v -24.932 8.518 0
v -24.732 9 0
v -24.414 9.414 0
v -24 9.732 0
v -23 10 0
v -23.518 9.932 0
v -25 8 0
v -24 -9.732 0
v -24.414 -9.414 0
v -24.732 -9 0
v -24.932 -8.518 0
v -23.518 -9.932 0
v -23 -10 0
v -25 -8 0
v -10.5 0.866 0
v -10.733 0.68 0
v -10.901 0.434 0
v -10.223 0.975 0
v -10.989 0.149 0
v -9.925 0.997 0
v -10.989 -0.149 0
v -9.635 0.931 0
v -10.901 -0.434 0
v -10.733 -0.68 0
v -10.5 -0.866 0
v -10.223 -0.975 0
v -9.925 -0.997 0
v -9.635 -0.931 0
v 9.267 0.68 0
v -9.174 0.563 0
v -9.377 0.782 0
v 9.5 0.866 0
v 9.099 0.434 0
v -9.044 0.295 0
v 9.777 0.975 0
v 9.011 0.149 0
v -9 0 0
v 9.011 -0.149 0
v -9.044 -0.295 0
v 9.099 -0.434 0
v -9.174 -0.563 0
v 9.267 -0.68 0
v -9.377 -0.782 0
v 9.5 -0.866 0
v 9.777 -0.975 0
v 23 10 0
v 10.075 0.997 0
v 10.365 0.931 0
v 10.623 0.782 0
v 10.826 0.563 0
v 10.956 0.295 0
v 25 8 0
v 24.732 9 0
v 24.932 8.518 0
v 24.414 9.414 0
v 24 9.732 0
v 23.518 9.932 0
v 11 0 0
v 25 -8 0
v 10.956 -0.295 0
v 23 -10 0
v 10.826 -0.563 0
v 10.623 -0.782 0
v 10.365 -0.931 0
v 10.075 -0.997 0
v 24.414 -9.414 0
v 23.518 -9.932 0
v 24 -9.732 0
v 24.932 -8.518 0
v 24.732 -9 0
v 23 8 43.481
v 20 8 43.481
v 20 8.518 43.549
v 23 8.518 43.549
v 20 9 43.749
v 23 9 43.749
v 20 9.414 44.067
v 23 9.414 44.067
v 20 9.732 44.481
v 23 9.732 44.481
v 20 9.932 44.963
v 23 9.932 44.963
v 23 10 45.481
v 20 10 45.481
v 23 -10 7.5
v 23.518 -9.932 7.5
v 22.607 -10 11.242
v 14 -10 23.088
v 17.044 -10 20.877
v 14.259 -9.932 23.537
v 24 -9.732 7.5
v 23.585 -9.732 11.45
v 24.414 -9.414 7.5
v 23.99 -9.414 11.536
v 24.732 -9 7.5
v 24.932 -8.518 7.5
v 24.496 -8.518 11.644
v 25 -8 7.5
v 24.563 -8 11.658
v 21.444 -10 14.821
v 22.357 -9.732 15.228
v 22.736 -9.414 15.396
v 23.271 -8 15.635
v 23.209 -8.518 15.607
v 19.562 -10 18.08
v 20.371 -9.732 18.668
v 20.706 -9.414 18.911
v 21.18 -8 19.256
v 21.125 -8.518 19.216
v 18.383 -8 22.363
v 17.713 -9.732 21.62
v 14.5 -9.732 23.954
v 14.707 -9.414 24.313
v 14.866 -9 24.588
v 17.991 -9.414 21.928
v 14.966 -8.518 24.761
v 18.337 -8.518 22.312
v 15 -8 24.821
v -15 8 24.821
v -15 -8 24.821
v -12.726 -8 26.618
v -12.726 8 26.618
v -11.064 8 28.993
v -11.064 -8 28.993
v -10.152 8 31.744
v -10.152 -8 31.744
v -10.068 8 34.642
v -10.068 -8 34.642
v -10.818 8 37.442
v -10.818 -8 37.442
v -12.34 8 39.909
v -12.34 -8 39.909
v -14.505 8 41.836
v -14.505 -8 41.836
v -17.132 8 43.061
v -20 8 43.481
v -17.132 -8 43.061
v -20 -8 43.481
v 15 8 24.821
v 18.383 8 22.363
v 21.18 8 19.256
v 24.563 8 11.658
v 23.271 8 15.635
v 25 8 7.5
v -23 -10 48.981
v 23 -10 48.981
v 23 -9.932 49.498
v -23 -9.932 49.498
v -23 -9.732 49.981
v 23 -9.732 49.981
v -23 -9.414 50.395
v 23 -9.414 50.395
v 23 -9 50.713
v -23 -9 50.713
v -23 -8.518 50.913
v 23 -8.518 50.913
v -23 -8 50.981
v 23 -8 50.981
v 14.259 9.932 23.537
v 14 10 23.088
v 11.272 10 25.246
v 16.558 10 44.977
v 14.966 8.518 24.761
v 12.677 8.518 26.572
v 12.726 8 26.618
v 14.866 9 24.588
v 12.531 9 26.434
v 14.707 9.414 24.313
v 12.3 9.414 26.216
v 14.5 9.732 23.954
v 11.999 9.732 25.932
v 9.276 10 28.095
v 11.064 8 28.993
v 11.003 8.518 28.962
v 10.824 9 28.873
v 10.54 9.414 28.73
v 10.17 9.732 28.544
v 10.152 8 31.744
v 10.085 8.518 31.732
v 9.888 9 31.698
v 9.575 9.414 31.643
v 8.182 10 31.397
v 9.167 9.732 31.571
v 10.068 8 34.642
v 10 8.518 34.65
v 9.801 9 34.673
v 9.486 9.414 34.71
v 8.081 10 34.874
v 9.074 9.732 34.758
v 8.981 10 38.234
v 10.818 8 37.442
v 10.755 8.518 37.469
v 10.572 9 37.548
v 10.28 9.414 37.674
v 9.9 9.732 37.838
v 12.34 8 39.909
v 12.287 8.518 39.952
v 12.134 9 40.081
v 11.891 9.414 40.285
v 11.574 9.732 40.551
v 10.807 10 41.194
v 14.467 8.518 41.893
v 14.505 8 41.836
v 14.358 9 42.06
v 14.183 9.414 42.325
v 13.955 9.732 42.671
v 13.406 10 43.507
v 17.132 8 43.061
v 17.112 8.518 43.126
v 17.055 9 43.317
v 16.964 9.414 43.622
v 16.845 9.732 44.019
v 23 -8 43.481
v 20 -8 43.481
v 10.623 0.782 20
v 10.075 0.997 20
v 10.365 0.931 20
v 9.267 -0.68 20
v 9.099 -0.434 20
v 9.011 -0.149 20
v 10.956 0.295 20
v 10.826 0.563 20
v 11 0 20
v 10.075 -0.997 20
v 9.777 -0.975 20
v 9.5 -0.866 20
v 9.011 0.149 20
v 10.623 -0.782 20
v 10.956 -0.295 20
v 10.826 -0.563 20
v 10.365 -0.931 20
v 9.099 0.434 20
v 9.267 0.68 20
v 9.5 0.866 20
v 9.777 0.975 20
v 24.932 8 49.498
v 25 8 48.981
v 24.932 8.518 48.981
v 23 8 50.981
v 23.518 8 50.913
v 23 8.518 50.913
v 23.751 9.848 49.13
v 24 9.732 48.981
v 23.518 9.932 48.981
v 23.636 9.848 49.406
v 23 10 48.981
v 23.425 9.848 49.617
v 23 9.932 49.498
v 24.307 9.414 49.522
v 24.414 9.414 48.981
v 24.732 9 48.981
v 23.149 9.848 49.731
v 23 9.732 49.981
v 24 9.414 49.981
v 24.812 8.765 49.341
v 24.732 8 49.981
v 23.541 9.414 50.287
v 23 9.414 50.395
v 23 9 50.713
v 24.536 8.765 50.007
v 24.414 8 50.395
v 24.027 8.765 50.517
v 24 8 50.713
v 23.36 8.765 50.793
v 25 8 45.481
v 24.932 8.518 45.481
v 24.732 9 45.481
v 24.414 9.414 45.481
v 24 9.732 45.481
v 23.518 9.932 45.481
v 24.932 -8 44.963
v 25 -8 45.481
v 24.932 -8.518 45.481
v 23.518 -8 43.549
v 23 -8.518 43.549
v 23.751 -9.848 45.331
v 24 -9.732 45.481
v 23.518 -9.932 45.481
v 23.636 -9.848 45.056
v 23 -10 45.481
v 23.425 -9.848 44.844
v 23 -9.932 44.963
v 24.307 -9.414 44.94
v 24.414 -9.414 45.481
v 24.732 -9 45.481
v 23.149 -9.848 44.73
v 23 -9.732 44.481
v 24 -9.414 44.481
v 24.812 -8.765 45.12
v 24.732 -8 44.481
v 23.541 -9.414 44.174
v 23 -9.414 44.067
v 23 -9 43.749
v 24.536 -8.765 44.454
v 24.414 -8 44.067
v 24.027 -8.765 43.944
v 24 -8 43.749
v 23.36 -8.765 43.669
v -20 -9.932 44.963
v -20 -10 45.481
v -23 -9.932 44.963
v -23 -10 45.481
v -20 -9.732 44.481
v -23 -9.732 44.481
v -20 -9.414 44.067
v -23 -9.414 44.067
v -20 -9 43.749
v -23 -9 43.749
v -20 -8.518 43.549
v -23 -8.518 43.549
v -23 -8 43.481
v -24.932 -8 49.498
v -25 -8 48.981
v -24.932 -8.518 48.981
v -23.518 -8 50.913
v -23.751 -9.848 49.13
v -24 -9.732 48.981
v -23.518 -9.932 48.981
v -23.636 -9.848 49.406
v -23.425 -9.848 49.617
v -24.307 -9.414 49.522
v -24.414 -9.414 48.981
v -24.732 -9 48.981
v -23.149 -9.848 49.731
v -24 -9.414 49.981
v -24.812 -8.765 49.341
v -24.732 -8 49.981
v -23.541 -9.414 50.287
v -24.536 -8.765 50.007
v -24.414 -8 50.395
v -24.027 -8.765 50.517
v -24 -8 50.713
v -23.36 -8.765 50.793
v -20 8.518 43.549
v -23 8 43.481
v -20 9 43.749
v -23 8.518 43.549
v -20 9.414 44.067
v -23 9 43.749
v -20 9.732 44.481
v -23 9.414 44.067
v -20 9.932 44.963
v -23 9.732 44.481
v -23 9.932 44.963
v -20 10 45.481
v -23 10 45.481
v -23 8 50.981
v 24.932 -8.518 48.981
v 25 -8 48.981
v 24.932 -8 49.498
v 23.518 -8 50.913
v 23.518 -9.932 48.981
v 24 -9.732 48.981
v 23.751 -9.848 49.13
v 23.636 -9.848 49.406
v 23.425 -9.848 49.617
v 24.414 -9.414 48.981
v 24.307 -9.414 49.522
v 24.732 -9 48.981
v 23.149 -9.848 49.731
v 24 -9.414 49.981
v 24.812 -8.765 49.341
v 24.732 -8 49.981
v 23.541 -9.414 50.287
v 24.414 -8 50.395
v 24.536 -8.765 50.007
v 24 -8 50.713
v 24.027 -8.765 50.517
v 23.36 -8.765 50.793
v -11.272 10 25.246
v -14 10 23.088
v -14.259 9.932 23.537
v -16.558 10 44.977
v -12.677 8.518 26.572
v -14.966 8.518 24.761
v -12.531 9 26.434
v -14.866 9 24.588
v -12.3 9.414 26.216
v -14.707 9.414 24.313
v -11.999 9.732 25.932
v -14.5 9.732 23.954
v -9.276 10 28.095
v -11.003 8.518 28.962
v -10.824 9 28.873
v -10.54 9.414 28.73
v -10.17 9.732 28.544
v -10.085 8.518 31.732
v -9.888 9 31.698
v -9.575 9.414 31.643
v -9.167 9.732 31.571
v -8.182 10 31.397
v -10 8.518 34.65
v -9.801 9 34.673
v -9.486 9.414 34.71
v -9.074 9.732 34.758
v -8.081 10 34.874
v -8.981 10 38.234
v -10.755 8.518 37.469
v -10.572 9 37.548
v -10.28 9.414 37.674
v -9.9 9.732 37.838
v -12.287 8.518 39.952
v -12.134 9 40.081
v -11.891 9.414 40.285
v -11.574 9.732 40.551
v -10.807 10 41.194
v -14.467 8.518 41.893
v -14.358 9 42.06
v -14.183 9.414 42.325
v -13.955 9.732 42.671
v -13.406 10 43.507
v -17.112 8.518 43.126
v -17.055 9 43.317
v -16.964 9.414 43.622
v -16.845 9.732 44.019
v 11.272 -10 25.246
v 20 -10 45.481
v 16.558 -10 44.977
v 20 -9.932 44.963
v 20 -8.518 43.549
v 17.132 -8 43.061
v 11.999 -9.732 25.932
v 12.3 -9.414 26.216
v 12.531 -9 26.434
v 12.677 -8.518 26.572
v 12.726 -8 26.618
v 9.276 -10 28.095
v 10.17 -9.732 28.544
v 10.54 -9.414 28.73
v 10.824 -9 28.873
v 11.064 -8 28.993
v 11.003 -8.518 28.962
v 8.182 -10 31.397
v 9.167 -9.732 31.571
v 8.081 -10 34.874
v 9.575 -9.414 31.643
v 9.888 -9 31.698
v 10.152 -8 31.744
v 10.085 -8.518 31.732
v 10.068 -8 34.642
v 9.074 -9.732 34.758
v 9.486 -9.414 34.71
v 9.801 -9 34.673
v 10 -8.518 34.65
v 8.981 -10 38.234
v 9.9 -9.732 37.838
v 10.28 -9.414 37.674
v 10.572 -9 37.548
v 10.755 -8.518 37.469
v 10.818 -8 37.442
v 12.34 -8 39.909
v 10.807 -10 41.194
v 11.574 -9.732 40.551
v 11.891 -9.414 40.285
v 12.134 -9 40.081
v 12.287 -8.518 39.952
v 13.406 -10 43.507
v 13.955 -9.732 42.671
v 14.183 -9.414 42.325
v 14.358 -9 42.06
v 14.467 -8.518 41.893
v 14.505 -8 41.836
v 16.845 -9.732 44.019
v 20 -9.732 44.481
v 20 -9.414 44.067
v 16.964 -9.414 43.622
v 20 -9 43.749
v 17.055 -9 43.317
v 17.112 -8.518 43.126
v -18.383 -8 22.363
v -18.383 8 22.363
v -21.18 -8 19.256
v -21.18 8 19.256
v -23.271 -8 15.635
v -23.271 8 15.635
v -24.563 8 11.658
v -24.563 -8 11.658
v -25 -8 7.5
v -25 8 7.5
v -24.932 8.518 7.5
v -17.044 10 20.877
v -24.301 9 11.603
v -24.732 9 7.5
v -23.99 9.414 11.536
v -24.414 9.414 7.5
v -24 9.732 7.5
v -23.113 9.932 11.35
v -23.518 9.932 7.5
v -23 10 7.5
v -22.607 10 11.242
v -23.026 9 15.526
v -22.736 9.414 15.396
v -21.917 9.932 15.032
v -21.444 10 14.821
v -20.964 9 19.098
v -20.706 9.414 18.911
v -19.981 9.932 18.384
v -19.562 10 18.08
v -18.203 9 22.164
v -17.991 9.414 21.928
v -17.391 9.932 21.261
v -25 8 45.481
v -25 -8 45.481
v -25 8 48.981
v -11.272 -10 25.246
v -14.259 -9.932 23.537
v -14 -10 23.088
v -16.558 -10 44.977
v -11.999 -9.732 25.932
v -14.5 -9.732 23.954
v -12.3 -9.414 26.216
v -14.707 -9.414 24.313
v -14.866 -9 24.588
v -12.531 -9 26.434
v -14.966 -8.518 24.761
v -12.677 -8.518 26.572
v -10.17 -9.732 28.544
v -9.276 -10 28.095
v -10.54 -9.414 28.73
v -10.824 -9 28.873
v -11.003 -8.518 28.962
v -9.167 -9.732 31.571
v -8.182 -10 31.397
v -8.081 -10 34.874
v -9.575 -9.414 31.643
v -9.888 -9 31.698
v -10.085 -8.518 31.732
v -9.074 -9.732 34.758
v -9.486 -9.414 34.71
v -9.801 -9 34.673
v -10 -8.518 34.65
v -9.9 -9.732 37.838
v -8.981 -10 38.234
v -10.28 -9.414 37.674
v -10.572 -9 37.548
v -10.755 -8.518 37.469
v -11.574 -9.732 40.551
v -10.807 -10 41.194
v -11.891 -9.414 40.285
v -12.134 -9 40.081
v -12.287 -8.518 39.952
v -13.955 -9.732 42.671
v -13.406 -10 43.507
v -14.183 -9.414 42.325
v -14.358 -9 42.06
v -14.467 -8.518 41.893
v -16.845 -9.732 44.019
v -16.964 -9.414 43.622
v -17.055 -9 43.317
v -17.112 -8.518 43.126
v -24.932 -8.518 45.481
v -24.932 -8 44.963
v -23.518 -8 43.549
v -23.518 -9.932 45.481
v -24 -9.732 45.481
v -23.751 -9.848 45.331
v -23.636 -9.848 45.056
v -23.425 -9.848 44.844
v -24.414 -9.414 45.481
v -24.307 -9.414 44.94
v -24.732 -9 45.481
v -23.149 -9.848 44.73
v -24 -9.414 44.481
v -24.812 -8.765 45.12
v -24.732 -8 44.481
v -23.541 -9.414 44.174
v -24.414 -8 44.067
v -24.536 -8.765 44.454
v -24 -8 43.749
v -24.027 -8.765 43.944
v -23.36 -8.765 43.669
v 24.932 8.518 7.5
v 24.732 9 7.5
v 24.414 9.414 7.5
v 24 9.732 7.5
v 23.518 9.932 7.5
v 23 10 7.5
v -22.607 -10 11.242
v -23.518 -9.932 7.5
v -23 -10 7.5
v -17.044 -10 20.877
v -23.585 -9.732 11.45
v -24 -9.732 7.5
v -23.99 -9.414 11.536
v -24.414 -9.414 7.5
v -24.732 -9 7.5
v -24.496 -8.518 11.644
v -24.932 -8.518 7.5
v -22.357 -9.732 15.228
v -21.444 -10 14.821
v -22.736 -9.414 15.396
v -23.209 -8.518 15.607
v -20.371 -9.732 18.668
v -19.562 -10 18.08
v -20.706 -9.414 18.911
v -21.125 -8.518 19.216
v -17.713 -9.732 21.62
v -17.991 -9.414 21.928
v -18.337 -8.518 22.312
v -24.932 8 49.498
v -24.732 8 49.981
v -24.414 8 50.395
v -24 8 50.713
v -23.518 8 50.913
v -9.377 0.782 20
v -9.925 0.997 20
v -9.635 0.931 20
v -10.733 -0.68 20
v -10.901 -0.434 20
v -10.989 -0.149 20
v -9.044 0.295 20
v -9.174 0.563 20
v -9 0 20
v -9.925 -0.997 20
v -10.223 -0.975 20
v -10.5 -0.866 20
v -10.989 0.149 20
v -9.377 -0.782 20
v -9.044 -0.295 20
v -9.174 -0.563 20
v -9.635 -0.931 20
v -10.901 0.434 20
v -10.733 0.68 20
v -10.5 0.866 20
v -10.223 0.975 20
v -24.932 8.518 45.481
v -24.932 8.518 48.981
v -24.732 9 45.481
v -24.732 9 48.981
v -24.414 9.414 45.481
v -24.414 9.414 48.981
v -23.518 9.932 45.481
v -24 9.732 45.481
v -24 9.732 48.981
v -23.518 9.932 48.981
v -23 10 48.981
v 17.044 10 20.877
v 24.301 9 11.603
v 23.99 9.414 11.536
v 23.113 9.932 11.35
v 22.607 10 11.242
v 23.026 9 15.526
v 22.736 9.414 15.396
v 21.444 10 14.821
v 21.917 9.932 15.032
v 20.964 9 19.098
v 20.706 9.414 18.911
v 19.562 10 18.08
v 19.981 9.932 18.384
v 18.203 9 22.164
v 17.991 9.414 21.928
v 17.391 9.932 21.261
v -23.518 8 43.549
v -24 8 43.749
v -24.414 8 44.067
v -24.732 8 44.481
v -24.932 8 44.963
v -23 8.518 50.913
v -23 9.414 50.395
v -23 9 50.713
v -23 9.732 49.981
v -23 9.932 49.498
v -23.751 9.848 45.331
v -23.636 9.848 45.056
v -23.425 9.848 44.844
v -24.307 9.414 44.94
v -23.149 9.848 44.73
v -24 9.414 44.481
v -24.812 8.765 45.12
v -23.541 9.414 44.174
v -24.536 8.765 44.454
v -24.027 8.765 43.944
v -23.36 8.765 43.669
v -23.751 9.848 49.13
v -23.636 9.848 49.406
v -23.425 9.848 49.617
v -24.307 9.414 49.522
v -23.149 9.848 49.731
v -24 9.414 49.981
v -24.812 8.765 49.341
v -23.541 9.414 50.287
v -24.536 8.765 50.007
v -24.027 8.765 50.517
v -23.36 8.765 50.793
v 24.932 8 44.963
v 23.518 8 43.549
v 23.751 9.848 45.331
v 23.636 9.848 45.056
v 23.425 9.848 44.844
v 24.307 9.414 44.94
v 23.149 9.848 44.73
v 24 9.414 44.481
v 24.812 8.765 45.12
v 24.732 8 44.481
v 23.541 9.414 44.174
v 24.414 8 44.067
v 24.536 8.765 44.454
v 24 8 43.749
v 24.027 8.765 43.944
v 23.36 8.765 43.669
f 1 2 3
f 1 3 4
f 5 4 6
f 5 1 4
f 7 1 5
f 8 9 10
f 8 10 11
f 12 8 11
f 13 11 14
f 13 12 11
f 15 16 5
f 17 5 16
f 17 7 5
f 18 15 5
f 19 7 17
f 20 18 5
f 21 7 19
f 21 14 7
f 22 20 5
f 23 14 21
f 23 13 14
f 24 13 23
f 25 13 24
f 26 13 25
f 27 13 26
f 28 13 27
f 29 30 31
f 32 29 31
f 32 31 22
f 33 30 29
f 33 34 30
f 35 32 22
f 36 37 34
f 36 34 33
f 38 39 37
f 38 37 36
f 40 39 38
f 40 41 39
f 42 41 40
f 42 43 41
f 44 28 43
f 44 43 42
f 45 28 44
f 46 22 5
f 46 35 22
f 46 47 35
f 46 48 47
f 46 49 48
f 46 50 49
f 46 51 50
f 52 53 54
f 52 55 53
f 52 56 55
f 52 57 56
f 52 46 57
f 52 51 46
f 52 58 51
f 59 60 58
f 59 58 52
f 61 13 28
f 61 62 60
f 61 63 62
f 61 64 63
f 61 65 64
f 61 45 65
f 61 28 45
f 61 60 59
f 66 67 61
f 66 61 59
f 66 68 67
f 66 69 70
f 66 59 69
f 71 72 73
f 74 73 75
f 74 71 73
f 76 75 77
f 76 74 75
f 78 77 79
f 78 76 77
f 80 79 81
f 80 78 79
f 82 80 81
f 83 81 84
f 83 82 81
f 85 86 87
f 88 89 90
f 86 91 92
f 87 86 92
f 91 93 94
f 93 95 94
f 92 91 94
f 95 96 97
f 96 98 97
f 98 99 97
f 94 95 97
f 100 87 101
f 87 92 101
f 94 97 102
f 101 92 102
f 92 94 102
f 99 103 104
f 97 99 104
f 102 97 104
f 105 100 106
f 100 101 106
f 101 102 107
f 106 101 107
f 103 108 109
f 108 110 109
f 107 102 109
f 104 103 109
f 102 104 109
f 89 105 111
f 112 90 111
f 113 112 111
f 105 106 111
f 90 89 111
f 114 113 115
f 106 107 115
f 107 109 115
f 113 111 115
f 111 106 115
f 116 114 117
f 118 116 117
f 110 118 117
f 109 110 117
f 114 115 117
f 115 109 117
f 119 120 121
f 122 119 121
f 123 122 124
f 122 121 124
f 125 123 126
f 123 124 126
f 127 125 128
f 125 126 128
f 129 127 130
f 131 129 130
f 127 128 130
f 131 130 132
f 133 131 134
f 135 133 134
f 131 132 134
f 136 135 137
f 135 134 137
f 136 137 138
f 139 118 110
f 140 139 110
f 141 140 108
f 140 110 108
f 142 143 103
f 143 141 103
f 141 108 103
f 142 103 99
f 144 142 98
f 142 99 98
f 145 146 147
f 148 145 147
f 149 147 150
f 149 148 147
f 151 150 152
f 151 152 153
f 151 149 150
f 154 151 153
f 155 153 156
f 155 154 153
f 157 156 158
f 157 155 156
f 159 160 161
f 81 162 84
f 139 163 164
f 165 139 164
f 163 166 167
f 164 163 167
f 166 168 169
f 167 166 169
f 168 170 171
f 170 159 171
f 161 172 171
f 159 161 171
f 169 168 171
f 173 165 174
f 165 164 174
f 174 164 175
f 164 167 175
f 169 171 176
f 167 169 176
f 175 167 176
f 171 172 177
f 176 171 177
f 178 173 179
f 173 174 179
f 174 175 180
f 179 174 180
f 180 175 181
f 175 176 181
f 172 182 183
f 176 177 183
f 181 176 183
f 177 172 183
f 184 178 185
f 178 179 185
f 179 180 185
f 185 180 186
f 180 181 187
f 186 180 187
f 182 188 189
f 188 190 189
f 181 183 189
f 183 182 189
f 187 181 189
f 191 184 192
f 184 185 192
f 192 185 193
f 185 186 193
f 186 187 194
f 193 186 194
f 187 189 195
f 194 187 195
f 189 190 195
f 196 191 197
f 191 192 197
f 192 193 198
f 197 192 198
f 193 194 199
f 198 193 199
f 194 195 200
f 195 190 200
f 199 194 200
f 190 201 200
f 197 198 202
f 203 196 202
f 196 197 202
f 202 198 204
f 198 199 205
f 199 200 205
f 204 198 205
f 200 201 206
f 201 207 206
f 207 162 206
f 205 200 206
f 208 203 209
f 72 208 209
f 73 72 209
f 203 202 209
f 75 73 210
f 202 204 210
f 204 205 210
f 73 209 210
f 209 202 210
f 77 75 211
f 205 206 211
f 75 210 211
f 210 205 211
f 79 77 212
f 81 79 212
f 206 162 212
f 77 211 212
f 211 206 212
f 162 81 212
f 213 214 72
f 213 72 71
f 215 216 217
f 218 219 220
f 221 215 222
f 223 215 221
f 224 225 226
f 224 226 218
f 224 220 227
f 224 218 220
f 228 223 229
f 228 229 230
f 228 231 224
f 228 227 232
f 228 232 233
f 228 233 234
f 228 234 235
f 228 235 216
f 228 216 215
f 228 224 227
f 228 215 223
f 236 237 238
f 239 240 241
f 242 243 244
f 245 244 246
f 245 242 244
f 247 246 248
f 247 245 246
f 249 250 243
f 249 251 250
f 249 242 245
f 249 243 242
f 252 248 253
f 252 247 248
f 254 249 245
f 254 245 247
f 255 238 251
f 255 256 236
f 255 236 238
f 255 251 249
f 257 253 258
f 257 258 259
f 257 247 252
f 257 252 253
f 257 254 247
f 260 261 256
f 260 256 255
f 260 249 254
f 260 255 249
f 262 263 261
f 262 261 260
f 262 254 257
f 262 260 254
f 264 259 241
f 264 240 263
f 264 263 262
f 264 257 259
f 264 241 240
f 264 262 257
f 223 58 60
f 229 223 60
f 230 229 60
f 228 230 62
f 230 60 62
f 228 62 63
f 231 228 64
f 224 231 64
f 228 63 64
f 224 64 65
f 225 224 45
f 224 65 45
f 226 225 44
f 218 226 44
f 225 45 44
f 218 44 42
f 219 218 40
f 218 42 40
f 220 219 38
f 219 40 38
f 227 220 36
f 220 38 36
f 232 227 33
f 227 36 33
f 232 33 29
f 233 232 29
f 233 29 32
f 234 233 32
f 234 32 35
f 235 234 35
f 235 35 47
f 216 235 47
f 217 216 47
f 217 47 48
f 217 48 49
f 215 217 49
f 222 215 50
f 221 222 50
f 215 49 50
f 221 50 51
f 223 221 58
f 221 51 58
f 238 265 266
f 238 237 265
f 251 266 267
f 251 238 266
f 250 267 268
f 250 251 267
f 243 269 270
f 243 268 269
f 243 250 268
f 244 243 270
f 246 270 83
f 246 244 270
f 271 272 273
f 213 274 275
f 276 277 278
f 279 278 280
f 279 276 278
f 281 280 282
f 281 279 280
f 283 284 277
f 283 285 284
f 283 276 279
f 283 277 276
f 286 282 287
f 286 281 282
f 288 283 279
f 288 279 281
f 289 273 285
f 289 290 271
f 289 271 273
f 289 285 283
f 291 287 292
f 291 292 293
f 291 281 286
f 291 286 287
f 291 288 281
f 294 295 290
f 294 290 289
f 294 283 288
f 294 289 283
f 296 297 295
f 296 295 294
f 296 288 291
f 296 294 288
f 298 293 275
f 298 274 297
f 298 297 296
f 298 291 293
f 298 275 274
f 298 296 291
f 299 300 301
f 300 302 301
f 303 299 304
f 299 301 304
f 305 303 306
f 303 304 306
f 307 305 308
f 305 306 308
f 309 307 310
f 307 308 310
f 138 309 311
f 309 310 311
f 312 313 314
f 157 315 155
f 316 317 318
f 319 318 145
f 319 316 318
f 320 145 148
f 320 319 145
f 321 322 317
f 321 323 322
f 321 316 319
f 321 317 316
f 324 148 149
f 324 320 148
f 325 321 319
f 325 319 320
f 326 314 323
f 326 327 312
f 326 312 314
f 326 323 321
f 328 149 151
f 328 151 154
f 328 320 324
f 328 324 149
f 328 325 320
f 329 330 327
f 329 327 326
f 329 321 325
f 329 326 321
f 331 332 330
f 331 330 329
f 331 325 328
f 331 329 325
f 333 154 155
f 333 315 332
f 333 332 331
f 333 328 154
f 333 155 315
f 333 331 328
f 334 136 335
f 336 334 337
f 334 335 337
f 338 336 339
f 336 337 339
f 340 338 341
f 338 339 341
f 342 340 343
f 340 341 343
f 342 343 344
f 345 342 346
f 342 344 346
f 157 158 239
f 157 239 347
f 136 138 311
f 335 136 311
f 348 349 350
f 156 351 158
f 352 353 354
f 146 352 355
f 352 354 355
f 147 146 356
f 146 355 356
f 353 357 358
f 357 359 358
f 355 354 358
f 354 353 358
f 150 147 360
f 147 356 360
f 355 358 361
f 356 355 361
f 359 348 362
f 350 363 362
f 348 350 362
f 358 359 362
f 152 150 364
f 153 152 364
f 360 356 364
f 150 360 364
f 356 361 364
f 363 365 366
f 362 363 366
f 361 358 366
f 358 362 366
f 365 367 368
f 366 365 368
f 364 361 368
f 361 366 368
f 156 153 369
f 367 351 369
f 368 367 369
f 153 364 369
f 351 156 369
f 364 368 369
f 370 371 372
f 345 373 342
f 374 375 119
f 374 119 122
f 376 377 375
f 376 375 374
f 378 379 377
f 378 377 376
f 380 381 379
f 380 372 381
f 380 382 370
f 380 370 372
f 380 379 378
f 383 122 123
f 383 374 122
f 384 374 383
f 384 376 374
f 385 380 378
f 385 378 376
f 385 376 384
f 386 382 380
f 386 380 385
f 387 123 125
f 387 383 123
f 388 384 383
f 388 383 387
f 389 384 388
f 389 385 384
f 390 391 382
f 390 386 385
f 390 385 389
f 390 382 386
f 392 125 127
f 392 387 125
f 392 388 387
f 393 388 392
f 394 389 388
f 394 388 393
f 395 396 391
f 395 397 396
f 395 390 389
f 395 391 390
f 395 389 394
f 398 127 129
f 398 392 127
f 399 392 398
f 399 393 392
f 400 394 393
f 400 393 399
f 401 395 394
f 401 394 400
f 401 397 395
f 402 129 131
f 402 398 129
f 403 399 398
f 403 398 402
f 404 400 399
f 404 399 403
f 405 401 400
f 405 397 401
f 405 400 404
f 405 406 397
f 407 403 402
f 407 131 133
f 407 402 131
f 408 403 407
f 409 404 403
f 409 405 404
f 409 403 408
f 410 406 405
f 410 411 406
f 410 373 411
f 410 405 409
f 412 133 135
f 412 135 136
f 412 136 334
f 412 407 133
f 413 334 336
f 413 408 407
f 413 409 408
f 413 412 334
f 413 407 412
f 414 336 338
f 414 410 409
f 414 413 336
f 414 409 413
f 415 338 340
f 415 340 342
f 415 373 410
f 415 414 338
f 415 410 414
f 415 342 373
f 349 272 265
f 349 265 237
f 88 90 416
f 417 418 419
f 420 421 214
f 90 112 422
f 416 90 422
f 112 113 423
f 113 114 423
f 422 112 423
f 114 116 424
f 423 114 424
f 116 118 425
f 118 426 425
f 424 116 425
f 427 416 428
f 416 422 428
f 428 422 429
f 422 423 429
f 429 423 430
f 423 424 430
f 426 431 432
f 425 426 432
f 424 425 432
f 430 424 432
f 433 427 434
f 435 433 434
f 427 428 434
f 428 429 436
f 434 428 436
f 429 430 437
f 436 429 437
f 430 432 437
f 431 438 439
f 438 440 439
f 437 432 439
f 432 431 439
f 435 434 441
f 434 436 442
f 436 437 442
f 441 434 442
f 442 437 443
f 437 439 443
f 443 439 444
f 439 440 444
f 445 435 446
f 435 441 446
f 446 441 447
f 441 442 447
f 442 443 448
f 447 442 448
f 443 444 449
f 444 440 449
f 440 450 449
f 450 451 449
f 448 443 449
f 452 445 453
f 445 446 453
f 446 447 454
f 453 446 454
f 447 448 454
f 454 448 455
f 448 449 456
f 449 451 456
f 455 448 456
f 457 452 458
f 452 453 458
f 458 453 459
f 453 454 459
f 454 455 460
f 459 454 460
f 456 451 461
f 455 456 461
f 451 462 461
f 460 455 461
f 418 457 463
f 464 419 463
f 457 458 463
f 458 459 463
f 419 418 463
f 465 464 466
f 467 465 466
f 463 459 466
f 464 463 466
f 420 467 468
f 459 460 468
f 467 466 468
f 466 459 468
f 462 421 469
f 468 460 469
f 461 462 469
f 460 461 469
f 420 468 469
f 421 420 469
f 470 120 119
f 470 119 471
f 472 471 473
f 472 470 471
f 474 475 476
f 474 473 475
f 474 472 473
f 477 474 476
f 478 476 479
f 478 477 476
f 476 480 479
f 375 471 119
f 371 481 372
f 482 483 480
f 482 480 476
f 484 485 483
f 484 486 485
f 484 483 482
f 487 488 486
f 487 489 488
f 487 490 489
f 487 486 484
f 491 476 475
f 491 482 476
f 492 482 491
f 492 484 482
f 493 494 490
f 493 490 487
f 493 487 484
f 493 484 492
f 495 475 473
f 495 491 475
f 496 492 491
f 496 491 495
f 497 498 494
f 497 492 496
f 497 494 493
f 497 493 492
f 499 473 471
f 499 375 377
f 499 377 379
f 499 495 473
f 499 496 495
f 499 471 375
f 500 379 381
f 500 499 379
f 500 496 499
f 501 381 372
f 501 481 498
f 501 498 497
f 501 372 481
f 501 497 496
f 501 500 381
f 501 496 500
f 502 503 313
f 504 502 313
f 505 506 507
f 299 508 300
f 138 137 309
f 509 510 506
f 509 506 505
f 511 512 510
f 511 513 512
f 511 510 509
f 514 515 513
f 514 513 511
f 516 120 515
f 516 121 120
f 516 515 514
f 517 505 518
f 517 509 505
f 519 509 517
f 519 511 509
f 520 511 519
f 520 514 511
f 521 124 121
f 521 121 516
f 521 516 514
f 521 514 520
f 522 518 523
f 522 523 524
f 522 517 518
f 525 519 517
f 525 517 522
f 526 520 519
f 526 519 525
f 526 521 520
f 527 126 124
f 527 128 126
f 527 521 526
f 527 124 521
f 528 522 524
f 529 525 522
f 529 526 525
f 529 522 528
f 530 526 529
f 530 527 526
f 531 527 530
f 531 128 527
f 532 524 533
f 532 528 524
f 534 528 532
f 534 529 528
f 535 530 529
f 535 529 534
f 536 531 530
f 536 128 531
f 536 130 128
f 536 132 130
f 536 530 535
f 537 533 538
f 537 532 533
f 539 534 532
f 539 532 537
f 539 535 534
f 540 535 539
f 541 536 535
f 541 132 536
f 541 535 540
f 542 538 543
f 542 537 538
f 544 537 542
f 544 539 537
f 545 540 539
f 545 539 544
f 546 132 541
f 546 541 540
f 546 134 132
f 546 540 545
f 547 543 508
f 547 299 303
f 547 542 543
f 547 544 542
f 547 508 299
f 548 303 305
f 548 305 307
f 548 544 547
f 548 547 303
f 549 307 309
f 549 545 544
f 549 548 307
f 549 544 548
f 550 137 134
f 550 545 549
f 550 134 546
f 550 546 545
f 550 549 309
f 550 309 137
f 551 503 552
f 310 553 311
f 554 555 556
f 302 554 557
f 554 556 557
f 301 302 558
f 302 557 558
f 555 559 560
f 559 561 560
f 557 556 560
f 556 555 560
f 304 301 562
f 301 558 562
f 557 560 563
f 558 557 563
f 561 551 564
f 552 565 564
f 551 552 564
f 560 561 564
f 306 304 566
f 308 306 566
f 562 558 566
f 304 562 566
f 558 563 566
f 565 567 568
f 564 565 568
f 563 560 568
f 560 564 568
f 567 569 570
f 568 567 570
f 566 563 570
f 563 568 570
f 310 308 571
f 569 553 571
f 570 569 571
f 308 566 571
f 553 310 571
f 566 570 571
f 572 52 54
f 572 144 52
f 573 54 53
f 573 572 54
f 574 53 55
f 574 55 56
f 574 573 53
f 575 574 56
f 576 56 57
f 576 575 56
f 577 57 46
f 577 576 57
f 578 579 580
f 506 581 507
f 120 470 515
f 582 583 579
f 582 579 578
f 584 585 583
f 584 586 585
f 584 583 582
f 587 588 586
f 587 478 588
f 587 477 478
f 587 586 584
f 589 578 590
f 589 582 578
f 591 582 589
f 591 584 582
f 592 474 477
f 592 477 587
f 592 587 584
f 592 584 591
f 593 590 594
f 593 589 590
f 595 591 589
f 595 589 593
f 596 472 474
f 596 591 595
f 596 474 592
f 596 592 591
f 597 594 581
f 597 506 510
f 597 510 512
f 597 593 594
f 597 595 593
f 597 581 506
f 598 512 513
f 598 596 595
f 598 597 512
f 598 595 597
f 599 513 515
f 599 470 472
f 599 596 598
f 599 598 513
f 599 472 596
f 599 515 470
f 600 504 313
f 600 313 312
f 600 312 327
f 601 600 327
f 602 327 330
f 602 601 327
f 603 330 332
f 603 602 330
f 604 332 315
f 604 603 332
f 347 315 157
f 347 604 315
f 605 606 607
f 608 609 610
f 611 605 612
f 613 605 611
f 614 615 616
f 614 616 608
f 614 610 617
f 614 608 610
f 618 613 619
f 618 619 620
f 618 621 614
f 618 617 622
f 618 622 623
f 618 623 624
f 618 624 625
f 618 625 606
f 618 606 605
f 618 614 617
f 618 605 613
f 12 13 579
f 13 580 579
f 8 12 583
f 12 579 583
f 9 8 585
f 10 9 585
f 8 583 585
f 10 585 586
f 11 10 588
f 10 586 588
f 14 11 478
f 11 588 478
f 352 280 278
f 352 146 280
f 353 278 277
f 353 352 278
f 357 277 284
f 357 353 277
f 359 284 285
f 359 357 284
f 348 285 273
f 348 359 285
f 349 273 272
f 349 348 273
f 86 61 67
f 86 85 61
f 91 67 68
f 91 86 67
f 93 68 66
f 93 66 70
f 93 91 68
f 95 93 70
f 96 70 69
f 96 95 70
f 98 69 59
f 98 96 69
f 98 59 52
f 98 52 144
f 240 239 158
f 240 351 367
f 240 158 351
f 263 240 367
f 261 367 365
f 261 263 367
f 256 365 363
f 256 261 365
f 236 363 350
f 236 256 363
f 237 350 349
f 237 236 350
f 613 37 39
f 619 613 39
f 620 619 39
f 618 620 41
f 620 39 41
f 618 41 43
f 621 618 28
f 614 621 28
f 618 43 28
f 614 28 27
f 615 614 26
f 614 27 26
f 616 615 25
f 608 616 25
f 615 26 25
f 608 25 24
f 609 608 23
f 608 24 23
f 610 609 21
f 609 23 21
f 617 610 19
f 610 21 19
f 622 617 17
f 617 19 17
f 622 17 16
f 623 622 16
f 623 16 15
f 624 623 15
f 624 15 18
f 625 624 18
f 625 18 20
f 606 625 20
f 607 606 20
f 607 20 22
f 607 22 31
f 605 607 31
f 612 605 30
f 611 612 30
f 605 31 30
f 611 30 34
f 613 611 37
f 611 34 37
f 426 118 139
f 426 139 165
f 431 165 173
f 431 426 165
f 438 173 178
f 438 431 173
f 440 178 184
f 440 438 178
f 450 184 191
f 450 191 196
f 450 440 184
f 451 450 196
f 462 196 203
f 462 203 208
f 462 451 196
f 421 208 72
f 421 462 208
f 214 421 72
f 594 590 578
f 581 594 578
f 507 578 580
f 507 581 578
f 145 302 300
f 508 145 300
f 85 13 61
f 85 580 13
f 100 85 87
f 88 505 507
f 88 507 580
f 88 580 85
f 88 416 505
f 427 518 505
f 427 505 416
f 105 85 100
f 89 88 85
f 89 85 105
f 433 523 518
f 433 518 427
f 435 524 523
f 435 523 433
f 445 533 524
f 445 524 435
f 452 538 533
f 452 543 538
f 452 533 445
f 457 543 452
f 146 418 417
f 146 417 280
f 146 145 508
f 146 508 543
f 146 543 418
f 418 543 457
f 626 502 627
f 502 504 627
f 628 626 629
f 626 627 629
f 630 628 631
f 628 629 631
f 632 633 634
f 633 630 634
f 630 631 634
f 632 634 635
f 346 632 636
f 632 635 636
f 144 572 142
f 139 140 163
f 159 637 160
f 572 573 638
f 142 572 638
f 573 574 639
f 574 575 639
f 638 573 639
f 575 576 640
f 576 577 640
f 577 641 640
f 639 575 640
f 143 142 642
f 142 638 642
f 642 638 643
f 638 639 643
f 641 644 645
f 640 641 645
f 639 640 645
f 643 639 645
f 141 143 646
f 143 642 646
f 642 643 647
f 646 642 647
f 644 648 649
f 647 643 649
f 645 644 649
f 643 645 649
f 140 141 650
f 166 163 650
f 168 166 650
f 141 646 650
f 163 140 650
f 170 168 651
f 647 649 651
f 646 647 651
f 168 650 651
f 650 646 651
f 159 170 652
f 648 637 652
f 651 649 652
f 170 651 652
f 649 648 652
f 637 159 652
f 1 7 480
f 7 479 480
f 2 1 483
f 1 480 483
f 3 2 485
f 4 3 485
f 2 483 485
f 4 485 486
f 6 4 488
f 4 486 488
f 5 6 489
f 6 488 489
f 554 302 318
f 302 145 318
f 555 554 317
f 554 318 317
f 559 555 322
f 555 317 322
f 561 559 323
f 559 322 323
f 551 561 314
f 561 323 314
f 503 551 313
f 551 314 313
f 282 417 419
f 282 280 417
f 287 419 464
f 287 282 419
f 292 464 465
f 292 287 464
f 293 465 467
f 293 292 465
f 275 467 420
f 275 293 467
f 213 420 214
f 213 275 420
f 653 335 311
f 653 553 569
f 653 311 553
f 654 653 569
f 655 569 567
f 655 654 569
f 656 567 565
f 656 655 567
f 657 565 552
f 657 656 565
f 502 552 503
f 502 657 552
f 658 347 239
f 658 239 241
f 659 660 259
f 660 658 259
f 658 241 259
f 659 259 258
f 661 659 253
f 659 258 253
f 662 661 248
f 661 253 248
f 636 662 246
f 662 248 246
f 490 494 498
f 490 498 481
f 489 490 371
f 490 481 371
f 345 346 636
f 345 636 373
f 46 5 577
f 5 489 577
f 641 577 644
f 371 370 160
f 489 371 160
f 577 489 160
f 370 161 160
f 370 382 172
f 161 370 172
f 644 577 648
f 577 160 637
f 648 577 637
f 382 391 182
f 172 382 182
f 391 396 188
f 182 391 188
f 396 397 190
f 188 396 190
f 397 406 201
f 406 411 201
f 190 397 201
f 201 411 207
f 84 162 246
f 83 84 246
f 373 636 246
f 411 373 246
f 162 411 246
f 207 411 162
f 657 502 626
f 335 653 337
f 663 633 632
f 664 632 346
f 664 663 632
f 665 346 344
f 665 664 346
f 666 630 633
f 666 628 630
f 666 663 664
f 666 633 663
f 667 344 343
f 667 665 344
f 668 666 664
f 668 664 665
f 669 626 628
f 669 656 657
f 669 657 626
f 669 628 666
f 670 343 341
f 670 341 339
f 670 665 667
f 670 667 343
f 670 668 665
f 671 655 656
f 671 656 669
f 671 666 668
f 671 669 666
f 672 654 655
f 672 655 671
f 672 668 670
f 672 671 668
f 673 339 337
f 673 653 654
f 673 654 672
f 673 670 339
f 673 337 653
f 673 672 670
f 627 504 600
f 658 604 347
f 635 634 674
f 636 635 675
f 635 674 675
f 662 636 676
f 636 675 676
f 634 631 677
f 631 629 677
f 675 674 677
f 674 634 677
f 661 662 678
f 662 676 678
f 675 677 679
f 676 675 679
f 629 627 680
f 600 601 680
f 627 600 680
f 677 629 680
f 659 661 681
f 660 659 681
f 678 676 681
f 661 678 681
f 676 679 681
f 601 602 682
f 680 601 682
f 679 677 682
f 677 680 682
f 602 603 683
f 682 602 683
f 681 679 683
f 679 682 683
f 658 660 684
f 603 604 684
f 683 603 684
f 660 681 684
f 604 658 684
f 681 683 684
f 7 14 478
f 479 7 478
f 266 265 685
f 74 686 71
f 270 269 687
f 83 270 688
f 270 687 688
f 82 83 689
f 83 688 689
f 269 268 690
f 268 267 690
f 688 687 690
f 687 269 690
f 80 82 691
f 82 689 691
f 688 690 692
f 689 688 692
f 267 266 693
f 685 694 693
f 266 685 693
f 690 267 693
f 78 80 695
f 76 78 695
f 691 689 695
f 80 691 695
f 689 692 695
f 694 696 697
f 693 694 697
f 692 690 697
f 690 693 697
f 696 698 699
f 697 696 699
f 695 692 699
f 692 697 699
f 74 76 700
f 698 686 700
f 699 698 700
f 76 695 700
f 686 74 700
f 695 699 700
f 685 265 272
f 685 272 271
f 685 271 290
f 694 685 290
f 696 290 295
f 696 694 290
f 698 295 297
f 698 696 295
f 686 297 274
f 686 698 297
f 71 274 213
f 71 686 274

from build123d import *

# Parameters (mm, degrees)
PAD001_DEPTH    = 10
FILLET_R        = 2
SKETCH003_R     = 1
POCKET001_DEPTH = 20


with BuildPart() as part:
    # Sketch002 → Pad001 (new body, symmetric)
    with BuildSketch(Plane.XZ):
        with BuildLine():
            Line((-25, 0), (-25, 7.5))
            ThreePointArc((-15, 24.820508), (-22.320508, 17.5), (-25, 7.5))
            ThreePointArc((-15, 24.820508), (-10.340742, 36.068953), (-20, 43.480762))
            Line((-20, 43.480762), (-25, 43.480762))
            Line((-25, 43.480762), (-25, 50.980762))
            Line((-25, 50.980762), (0, 50.980762))
            Line((0, 50.980762), (0, 0))
            Line((0, 0), (-25, 0))
        make_face()
    pad001 = extrude(amount=PAD001_DEPTH, both=True)

    # Mirrored: Pad001 across Sketch002 V_Axis
    add(pad001.mirror(Plane(origin=(0, 0, 0), x_dir=(0, -1, 0), z_dir=(1, 0, 0))))

    # Fillet
    fillet_edges = [part.edges().sort_by_distance(p)[0] for p in [
        (25, 0, 43.480762),
        (25, 0, 50.980762),
        (25, 10, 47.230762),
        (25, -10, 47.230762),
        (-25, 0, 43.480762),
        (-25, 0, 50.980762),
        (-25, 10, 47.230762),
        (-25, -10, 47.230762),
        (0, -10, 50.980762),
        (0, 10, 50.980762),
        (22.5, -10, 43.480762),
        (10.340742, -10, 36.068953),
        (22.320508, -10, 17.5),
        (25, -10, 3.75),
        (25, 10, 3.75),
        (22.320508, 10, 17.5),
        (10.340742, 10, 36.068953),
        (22.5, 10, 43.480762),
        (-25, 10, 3.75),
        (-22.320508, 10, 17.5),
        (-10.340742, 10, 36.068953),
        (-22.5, 10, 43.480762),
        (-22.5, -10, 43.480762),
        (-10.340742, -10, 36.068953),
        (-22.320508, -10, 17.5),
        (-25, -10, 3.75),
    ]]
    fillet(fillet_edges, radius=FILLET_R)

    # Sketch003 (on Face2 of Fillet) → Pocket001 (cut)
    with BuildSketch(Plane(origin=(0, 0, 0), x_dir=(1, 0, 0), z_dir=(0, 0, -1))):
        with Locations((-10, 0)):
            Circle(SKETCH003_R)
        with Locations((10, 0)):
            Circle(SKETCH003_R)
    extrude(amount=-POCKET001_DEPTH, mode=Mode.SUBTRACT)


solid = part.part
